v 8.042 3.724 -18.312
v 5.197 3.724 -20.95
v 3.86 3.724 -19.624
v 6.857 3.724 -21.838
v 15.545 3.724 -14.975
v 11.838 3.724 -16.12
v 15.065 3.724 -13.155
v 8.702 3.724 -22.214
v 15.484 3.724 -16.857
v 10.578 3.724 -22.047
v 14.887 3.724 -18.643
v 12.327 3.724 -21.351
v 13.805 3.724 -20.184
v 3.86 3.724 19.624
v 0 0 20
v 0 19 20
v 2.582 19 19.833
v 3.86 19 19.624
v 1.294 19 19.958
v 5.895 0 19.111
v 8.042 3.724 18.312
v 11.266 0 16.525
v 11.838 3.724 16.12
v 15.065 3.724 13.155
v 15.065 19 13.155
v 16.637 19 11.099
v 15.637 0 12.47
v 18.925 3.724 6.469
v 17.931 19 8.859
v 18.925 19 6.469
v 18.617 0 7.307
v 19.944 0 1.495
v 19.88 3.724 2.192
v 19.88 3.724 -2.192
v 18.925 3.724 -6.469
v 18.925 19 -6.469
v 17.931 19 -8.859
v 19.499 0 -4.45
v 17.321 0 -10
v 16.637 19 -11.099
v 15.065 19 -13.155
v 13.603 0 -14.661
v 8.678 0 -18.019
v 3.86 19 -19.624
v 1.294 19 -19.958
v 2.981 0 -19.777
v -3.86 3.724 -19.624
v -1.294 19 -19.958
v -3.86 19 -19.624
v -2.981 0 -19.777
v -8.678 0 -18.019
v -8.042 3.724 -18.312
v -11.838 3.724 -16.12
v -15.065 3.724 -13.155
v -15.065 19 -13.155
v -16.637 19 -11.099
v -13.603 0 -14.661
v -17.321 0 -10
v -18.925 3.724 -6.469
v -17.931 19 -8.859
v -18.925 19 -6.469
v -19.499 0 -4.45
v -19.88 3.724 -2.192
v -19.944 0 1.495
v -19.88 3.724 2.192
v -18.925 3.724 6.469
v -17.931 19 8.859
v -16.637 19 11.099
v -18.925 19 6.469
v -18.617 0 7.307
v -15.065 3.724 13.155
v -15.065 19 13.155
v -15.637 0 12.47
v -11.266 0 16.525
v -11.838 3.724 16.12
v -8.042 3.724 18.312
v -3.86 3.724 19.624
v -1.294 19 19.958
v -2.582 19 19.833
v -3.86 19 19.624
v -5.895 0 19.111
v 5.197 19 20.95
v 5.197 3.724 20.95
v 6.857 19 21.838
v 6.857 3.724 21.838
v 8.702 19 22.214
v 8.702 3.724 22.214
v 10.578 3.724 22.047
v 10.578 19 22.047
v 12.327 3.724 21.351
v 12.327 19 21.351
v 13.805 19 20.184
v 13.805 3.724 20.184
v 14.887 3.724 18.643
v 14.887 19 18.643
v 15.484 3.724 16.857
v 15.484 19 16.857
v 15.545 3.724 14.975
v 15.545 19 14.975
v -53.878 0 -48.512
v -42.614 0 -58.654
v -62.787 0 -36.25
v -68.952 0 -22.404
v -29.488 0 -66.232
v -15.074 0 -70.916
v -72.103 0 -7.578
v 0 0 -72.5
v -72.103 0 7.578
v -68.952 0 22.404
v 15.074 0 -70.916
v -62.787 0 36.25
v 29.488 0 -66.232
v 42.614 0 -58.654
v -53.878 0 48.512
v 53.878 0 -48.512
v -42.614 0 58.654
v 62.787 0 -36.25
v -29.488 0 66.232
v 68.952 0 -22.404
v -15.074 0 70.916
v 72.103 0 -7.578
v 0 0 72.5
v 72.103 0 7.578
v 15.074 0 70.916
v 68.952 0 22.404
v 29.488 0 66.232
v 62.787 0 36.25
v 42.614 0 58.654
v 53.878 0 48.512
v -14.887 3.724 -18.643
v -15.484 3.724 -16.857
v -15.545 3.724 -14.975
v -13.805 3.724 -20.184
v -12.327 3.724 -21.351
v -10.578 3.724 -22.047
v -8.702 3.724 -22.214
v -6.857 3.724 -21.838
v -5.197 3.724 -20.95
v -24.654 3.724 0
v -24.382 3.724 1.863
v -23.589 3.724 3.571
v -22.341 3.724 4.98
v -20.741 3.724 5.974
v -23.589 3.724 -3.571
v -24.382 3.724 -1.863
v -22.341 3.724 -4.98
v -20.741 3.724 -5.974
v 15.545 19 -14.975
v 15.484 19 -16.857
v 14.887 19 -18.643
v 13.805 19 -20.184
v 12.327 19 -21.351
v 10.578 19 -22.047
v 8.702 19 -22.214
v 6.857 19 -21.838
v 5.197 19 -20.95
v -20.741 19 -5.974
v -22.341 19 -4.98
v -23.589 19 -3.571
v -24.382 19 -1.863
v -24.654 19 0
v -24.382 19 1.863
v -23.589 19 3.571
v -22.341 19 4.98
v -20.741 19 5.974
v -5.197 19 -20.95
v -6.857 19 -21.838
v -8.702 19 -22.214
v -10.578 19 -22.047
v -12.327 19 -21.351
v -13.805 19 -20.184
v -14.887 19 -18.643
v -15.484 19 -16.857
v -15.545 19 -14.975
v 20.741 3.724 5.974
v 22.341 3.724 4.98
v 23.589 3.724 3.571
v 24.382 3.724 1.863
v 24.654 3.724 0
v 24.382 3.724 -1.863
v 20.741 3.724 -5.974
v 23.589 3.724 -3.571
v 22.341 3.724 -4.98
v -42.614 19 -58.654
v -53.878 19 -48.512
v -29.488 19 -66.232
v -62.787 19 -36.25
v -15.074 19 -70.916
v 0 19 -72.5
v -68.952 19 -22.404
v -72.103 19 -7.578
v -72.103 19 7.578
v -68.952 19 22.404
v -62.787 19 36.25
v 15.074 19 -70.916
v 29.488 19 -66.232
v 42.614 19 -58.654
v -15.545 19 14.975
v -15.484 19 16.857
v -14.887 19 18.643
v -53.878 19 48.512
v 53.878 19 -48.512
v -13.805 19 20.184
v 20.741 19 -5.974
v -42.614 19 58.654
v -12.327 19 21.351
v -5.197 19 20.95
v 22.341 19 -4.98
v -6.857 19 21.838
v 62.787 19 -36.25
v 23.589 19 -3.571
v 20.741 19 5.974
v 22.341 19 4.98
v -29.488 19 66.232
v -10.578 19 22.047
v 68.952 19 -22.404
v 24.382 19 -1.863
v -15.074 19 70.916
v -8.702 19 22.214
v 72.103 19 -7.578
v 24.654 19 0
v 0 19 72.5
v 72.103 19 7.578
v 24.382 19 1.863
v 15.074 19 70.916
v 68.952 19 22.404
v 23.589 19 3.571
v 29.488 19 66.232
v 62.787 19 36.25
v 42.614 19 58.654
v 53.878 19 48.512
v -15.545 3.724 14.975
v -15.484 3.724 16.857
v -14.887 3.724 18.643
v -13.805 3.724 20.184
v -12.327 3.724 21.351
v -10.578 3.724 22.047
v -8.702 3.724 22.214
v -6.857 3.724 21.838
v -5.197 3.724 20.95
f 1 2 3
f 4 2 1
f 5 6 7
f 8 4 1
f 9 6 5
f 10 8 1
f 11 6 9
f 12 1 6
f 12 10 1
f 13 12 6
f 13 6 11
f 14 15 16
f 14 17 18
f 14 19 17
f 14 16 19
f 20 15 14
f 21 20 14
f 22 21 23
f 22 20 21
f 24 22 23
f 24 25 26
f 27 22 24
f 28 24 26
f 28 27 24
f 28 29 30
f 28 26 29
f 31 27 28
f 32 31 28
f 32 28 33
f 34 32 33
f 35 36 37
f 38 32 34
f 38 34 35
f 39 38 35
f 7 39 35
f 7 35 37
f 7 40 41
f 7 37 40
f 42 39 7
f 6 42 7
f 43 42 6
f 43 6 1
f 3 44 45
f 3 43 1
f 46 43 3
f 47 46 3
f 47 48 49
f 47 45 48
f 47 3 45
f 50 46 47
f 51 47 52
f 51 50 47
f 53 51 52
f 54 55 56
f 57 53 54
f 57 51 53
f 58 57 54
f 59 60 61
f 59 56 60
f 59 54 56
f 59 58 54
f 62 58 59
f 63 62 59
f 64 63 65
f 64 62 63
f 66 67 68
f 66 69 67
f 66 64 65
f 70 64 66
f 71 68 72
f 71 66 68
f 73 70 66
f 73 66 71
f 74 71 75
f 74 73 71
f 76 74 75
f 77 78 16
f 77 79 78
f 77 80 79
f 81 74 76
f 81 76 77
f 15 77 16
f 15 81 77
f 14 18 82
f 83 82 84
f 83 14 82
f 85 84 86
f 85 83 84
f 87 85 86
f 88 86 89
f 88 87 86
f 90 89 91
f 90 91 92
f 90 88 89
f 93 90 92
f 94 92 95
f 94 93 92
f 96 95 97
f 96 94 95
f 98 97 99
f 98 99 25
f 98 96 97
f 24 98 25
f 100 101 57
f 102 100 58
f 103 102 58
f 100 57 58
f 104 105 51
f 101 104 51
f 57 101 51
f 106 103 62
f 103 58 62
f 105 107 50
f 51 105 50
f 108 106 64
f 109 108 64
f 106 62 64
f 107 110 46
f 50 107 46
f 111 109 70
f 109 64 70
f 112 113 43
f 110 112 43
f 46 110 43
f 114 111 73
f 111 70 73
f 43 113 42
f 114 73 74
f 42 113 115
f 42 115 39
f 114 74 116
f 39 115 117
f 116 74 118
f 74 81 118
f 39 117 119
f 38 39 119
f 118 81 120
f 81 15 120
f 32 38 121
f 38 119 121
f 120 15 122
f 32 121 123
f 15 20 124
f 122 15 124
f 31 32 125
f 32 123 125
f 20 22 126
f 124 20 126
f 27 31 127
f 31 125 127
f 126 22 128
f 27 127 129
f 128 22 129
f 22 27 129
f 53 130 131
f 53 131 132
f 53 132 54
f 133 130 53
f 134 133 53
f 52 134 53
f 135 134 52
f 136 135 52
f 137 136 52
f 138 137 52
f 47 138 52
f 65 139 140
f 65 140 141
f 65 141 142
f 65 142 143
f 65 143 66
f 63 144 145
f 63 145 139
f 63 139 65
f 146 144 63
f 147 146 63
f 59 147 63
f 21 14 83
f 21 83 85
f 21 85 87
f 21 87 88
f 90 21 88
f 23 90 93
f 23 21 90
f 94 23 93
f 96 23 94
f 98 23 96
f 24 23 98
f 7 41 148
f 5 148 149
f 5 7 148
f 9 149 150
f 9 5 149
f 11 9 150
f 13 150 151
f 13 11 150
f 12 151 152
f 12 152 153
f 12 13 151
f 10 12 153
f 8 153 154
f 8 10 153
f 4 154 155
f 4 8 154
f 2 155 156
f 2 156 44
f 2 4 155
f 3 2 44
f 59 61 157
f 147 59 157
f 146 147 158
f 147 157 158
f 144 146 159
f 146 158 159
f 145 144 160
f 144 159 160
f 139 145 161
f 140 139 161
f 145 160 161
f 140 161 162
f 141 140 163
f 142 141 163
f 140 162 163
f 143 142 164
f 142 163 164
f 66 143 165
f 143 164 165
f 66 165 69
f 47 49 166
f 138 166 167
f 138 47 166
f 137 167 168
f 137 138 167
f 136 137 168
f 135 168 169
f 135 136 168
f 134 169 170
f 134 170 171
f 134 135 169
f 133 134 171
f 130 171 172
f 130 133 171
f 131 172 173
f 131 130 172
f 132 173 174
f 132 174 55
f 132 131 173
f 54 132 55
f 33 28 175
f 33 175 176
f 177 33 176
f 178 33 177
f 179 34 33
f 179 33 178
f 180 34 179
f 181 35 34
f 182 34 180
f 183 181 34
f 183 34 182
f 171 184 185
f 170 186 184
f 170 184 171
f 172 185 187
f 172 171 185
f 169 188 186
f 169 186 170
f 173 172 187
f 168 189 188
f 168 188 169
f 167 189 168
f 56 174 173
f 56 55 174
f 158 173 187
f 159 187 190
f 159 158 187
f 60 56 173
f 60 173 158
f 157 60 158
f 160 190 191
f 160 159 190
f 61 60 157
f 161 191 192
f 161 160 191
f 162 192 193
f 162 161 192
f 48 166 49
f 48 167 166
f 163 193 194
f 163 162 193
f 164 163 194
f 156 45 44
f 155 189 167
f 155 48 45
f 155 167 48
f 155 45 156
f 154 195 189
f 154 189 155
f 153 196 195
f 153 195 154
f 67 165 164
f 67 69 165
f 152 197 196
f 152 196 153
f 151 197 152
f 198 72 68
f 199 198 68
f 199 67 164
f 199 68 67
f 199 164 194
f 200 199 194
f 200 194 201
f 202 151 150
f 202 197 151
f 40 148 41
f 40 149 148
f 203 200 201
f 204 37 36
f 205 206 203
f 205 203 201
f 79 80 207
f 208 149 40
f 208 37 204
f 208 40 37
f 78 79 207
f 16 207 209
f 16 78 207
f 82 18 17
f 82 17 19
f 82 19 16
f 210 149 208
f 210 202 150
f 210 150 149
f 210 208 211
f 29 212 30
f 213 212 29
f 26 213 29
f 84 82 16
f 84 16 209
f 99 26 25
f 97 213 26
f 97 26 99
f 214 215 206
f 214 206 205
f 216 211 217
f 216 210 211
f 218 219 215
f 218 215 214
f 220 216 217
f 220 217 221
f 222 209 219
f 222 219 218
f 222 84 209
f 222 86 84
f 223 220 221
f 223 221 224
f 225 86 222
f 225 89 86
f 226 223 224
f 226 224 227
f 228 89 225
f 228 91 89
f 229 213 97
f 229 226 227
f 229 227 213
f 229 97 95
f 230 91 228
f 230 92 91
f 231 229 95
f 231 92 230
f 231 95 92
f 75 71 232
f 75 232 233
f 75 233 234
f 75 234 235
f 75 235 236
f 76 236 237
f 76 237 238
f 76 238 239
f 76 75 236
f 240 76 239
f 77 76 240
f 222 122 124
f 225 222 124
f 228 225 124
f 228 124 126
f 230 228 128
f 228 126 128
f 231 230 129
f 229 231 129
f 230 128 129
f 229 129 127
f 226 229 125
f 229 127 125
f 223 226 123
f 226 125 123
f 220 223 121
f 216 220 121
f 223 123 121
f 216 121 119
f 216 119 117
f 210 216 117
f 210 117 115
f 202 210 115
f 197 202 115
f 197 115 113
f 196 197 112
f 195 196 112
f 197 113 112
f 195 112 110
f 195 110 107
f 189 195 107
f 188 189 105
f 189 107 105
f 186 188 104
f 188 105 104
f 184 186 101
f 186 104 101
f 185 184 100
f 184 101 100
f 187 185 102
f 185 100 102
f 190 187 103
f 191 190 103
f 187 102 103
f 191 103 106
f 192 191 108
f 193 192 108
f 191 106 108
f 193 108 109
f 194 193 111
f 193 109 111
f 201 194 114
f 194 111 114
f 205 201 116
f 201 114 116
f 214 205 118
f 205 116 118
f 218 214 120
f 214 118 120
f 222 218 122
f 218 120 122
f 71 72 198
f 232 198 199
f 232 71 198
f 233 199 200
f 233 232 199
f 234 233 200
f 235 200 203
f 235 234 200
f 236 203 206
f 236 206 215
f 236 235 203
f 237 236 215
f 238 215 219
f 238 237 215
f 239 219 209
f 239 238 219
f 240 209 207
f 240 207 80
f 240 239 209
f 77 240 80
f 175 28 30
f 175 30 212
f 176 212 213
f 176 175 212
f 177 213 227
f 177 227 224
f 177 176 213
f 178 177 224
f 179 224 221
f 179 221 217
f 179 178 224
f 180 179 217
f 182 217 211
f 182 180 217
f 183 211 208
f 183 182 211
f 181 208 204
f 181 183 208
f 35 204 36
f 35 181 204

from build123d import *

# Parameters (mm, degrees)
SKETCH1_R           = 72.5
BOSS_EXTRUDE1_DEPTH = 19
SKETCH2_R           = 20
CUT_EXTRUDE1_DEPTH  = 105.276075876
SKETCH3_R           = 6.517224347
CUT_EXTRUDE2_DEPTH  = 15.27601445
CIRPATTERN1_COUNT   = 6


with BuildPart() as part:
    # Sketch1 → Boss-Extrude1 (new body)
    with BuildSketch(Plane(origin=(0, 0, 0), x_dir=(1, 0, 0), z_dir=(0, 1, 0))):
        Circle(SKETCH1_R)
    extrude(amount=BOSS_EXTRUDE1_DEPTH)

    # Sketch2 → Cut-Extrude1 (cut, through all)
    with BuildSketch(Plane(origin=(0, 0, 0), x_dir=(1, 0, 0), z_dir=(0, 1, 0))):
        Circle(SKETCH2_R)
    extrude(amount=CUT_EXTRUDE1_DEPTH, mode=Mode.SUBTRACT)

    # Sketch3 → Cut-Extrude2 (cut)
    with BuildSketch(Plane(origin=(0, 19, 0), x_dir=(1, 0, 0), z_dir=(0, 1, 0))):
        with Locations((-18.137210473, 0)):
            Circle(SKETCH3_R)
    cut_extrude2 = extrude(amount=-CUT_EXTRUDE2_DEPTH, mode=Mode.SUBTRACT)

    # CirPattern1: Cut-Extrude2 ×6 about axis
    cirpattern1_axis = Axis((0, 0, 0), (0, 1, 0))
    for i in range(1, CIRPATTERN1_COUNT):
        add(cut_extrude2.rotate(cirpattern1_axis, i * 360 / CIRPATTERN1_COUNT), mode=Mode.SUBTRACT)


solid = part.part
